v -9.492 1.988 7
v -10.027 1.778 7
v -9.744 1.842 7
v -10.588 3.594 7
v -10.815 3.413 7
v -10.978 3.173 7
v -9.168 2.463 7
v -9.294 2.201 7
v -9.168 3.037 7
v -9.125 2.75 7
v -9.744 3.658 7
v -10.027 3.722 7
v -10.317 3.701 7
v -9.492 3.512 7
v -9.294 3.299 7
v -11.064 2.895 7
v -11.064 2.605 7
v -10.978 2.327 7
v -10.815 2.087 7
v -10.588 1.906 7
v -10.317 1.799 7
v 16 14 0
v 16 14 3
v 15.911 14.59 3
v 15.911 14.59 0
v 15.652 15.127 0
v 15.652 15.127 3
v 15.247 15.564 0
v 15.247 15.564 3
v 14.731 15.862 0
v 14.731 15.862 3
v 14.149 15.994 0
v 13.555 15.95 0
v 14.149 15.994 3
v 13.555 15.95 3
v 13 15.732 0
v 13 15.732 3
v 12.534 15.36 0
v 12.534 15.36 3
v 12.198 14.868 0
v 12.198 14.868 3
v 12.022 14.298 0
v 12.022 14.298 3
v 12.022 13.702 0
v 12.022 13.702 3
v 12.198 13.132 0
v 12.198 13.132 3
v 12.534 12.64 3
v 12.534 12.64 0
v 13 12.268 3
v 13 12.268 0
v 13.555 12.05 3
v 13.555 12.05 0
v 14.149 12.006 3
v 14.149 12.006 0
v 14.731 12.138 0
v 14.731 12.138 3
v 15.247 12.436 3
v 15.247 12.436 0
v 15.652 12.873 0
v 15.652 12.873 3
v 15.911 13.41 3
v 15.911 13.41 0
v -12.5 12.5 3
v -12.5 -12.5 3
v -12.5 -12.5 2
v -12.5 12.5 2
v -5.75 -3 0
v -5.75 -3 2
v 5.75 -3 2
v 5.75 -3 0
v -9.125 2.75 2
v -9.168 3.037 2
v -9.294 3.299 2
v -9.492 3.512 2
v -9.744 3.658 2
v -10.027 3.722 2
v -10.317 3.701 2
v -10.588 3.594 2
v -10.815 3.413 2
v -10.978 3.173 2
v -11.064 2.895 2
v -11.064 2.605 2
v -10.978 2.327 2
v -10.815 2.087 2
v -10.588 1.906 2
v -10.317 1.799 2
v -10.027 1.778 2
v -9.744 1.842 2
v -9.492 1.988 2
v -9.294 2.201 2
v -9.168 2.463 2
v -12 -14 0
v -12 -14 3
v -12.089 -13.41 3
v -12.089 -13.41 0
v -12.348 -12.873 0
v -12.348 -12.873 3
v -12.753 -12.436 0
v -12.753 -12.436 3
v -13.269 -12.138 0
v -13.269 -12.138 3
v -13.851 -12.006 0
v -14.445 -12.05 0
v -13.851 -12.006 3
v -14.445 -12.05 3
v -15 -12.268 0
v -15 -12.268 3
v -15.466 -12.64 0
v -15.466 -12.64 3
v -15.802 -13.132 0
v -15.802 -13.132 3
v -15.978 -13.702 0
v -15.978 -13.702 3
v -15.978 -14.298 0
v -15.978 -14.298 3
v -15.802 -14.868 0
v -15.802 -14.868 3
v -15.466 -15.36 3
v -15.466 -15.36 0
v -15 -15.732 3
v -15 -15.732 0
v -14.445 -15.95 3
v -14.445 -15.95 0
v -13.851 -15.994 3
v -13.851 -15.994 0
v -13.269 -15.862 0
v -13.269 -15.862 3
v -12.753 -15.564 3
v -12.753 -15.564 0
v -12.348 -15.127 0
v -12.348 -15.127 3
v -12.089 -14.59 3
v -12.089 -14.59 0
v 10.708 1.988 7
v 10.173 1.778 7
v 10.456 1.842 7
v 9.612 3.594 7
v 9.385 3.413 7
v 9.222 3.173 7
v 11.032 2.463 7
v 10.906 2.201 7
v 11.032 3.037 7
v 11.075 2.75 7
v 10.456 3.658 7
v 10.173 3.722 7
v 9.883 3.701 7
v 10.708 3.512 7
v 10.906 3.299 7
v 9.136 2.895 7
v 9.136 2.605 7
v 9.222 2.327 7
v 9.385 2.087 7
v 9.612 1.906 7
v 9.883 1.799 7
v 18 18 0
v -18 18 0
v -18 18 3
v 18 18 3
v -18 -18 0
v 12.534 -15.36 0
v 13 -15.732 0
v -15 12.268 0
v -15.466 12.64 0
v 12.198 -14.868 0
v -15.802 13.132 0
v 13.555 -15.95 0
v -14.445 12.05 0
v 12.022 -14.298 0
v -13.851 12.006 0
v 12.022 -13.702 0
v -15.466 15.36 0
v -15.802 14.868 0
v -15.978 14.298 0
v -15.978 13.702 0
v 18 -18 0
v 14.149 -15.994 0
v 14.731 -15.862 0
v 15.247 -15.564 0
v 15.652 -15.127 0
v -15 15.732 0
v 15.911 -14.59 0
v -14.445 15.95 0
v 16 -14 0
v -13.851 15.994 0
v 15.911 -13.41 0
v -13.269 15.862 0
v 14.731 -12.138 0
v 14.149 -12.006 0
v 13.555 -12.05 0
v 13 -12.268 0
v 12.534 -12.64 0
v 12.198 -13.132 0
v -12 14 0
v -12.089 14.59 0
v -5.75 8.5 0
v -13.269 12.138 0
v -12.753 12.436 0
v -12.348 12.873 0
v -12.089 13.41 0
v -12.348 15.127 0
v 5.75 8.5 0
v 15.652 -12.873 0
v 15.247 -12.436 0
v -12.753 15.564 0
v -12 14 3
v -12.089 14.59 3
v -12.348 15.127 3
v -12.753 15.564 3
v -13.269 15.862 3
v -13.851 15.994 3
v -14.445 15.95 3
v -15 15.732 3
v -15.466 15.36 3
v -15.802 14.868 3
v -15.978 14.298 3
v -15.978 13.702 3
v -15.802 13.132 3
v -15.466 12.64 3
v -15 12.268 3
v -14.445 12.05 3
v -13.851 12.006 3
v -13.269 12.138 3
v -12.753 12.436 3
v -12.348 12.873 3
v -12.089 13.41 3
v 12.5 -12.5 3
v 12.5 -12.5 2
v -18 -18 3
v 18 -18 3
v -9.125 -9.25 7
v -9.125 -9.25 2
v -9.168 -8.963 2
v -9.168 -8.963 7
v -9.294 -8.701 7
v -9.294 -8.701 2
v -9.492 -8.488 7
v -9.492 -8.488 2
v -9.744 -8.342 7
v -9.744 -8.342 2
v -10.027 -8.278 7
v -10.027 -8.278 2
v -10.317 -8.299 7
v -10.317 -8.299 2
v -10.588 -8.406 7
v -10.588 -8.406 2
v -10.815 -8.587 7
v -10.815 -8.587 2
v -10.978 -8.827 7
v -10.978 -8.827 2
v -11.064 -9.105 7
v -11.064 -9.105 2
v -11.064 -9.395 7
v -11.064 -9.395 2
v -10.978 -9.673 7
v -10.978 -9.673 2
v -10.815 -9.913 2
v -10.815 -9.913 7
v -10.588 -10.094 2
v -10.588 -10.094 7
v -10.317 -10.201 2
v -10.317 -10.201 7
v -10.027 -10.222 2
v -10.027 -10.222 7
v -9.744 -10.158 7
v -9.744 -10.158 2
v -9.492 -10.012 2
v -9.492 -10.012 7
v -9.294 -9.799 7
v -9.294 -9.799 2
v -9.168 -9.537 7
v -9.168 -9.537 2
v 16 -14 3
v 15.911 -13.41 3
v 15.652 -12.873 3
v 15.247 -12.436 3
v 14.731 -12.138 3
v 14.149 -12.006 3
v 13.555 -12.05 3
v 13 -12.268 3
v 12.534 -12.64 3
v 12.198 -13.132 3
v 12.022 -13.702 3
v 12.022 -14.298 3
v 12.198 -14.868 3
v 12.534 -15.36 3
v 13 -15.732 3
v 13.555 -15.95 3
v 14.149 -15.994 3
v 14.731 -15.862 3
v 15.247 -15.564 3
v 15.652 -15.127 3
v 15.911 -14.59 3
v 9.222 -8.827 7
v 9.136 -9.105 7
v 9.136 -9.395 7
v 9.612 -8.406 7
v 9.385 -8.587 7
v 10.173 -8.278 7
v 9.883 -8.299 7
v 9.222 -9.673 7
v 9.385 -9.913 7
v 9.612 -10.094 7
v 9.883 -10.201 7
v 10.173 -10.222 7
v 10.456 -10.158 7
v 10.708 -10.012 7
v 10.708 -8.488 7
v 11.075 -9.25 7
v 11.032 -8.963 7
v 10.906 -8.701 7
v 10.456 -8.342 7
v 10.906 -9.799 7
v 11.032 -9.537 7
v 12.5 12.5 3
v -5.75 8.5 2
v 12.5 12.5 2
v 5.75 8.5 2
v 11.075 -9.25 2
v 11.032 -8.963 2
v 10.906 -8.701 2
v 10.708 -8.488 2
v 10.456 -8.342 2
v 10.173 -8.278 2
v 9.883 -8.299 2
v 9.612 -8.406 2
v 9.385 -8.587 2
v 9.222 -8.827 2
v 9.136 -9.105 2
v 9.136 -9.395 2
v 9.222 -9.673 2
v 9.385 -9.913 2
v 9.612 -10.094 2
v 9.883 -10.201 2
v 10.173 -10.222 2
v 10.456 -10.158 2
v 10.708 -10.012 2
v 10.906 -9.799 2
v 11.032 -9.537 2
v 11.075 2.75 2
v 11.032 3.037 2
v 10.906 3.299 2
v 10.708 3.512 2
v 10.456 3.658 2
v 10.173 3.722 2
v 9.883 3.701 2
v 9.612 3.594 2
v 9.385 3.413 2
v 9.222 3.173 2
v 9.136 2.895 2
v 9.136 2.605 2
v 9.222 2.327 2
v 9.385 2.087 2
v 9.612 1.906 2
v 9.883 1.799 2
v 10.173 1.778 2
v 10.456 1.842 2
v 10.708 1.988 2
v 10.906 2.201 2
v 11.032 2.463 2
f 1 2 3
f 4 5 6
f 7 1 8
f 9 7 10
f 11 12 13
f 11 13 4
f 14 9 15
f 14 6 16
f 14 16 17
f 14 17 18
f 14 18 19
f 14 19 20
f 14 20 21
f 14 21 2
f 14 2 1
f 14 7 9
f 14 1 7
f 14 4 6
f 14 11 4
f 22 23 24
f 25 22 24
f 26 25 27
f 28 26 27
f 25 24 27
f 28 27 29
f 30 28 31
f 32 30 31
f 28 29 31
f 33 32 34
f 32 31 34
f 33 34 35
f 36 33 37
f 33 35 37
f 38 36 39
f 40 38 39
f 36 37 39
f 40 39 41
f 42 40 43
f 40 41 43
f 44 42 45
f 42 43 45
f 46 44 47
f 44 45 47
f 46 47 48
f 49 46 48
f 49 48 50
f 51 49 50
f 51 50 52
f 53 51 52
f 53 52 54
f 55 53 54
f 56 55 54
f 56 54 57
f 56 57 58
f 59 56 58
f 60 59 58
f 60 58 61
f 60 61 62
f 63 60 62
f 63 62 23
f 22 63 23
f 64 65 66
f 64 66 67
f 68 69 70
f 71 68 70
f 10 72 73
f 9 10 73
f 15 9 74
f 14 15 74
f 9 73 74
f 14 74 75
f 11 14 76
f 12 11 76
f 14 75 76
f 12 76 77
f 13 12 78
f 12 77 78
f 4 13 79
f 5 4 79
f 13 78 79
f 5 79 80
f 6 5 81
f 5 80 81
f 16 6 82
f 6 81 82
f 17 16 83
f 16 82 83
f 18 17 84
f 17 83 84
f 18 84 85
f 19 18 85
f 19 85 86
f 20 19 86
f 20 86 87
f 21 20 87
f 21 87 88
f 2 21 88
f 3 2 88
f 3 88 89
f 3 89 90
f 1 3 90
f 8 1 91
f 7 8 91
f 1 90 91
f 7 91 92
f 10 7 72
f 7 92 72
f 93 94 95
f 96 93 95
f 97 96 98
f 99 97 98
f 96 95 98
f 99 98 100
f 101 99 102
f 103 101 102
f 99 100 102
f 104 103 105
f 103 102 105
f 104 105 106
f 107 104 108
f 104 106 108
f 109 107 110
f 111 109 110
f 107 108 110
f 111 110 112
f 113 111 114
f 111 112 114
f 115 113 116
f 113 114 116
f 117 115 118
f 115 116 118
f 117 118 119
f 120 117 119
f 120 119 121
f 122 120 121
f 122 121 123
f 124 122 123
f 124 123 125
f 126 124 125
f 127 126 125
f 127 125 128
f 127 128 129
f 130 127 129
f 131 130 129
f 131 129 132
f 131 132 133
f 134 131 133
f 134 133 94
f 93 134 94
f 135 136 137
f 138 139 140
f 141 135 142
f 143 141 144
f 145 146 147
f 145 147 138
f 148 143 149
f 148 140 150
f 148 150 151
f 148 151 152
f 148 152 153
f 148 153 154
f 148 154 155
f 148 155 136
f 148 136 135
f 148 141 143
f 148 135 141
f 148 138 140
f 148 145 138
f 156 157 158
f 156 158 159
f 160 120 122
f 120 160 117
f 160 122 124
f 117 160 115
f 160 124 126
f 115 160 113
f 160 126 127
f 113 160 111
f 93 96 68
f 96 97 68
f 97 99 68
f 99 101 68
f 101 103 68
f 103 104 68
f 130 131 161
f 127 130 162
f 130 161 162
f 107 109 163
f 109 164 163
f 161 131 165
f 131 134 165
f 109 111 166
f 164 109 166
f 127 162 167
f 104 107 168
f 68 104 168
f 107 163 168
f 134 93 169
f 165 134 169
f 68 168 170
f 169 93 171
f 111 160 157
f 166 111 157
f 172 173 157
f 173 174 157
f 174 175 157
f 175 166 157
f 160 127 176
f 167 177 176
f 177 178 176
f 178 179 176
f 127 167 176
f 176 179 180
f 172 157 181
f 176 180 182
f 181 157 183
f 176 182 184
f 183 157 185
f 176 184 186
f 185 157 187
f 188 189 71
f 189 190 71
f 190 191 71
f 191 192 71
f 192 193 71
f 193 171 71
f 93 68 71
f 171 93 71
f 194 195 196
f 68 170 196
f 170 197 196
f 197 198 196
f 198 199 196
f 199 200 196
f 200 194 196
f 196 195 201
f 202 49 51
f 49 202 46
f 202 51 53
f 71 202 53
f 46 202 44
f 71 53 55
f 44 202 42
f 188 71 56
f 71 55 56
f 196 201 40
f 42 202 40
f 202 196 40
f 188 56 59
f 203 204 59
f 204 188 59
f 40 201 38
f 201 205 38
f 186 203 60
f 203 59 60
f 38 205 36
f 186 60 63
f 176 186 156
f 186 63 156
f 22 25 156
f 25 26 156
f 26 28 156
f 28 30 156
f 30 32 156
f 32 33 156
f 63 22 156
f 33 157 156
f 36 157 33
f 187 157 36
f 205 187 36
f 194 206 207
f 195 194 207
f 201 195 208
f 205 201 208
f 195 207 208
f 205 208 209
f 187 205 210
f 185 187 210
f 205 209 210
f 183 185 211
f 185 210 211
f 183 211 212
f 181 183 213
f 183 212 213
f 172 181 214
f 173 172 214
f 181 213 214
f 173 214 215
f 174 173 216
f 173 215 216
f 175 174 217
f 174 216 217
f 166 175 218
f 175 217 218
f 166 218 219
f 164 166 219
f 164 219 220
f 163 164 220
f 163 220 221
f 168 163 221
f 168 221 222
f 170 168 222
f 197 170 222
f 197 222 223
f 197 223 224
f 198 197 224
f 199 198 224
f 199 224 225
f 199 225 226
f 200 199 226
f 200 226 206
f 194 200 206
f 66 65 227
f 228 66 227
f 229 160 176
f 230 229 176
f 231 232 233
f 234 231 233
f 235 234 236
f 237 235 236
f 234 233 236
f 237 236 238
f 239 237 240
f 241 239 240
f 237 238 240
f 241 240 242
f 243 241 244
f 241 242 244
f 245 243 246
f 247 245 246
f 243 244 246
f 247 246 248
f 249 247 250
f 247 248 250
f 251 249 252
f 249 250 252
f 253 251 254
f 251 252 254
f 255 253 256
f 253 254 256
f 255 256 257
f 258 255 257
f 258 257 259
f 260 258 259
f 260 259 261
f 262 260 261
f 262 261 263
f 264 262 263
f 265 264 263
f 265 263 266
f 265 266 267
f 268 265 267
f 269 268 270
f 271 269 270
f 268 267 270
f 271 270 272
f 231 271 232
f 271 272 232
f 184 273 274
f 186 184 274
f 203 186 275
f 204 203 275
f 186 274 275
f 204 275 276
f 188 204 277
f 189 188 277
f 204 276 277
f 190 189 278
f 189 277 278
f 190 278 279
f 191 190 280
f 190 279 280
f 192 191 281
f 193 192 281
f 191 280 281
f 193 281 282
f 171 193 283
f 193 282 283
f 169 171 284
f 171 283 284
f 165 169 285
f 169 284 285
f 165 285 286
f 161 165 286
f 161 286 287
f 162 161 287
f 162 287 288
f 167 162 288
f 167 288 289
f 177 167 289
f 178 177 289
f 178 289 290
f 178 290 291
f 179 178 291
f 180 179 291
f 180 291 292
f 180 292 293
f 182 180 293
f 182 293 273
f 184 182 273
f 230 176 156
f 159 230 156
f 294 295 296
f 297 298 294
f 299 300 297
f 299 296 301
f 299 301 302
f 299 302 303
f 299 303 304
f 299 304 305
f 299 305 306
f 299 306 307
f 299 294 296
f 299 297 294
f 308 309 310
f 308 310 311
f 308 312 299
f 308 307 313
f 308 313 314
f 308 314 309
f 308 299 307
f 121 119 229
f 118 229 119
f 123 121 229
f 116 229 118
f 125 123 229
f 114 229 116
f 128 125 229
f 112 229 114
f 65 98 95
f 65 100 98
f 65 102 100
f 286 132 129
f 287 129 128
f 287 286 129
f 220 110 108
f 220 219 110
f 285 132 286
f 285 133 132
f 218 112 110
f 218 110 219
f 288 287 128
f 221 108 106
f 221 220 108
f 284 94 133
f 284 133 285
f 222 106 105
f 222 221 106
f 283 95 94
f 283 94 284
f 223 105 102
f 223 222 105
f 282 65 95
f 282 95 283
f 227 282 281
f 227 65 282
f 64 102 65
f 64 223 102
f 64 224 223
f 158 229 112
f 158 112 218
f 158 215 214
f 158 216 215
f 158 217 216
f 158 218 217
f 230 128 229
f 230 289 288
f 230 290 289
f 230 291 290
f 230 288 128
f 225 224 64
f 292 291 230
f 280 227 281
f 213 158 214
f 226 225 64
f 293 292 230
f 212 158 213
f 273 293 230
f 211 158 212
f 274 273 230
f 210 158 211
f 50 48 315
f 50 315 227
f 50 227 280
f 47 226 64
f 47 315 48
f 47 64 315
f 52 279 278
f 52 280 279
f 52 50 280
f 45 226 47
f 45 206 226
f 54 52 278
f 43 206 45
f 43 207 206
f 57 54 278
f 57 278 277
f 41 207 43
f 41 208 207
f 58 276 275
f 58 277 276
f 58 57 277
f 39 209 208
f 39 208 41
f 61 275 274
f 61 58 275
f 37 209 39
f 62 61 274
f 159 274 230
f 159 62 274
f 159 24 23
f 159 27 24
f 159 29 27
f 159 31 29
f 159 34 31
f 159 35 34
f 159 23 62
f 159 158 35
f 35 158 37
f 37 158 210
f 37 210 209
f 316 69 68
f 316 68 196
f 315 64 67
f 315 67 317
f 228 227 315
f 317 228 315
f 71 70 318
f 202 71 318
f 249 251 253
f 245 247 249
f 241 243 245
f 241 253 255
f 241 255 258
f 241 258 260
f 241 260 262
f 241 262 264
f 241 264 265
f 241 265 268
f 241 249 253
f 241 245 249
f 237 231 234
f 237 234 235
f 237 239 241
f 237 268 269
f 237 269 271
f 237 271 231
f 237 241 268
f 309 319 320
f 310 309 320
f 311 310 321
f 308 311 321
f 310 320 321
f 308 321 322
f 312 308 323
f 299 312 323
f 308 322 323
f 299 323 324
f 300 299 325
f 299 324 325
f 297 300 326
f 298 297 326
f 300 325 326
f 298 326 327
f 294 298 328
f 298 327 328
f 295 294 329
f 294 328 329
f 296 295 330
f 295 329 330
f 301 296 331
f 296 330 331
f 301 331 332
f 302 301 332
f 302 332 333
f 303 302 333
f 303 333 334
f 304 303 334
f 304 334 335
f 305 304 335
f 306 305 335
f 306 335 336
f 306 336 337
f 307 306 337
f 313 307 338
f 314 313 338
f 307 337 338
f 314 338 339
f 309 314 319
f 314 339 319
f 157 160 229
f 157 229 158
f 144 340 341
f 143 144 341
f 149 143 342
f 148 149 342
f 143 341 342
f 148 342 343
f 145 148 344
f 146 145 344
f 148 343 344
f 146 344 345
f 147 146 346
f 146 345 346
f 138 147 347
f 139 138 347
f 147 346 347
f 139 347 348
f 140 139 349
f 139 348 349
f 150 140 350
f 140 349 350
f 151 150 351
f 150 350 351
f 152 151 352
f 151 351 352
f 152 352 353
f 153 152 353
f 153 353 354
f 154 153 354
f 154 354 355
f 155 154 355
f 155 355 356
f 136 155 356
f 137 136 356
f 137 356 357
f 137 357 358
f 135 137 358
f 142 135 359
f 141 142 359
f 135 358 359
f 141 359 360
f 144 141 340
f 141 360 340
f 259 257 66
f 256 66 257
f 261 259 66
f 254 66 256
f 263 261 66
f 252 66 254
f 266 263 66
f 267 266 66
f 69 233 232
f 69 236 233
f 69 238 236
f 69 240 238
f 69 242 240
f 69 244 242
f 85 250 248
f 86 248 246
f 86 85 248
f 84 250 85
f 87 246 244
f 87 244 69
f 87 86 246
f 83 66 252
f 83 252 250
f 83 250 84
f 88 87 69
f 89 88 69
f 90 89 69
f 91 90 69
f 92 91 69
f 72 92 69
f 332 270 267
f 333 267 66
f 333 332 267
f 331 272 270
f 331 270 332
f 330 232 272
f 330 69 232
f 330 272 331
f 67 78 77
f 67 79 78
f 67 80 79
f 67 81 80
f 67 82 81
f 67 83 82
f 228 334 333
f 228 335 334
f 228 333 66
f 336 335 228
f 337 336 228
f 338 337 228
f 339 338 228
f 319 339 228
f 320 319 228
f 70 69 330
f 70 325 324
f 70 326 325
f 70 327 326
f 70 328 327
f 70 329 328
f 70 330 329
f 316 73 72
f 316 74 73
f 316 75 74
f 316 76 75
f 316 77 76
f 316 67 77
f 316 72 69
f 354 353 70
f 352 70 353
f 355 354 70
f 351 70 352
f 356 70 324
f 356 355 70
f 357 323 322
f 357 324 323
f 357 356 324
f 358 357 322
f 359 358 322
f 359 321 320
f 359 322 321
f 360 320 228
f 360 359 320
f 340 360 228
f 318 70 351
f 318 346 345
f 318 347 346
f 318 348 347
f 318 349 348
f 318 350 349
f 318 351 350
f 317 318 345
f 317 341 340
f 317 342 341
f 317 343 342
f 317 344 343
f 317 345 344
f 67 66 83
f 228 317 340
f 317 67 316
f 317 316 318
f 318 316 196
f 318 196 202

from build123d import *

# Parameters (mm, degrees)
SKETCH1_W           = 36
SKETCH1_H           = 36
BOSS_EXTRUDE1_DEPTH = 3
SKETCH5_R           = 2
CUT_EXTRUDE3_DEPTH  = 10
SKETCH2_W           = 25
SKETCH2_H           = 25
CUT_EXTRUDE1_DEPTH  = 1
SKETCH4_W           = 11.5
SKETCH4_H           = 11.5
CUT_EXTRUDE4_DEPTH  = 3
SKETCH3_R           = 0.975
BOSS_EXTRUDE2_DEPTH = 5


with BuildPart() as part:
    # Sketch1 → Boss-Extrude1 (new body)
    with BuildSketch(Plane.XY):
        Rectangle(SKETCH1_W, SKETCH1_H)
    extrude(amount=BOSS_EXTRUDE1_DEPTH)

    # Sketch5 → Cut-Extrude3 (cut)
    with BuildSketch(Plane.XY.offset(3)):
        with Locations((-14, 14)):
            Circle(SKETCH5_R)
        with Locations((-14, -14)):
            Circle(SKETCH5_R)
        with Locations((14, -14)):
            Circle(SKETCH5_R)
        with Locations((14, 14)):
            Circle(SKETCH5_R)
    extrude(amount=-CUT_EXTRUDE3_DEPTH, mode=Mode.SUBTRACT)

    # Sketch2 → Cut-Extrude1 (cut)
    with BuildSketch(Plane.XY.offset(3)):
        Rectangle(SKETCH2_W, SKETCH2_H)
    extrude(amount=-CUT_EXTRUDE1_DEPTH, mode=Mode.SUBTRACT)

    # Sketch4 → Cut-Extrude4 (cut, through all)
    with BuildSketch(Plane.XY.offset(2)):
        with Locations((0, 2.75)):
            Rectangle(SKETCH4_W, SKETCH4_H)
    extrude(amount=-CUT_EXTRUDE4_DEPTH, mode=Mode.SUBTRACT)

    # Sketch3 → Boss-Extrude2 (add)
    with BuildSketch(Plane.XY.offset(2)):
        with Locations((10.1, 2.75)):
            Circle(SKETCH3_R)
        with Locations((10.1, -9.25)):
            Circle(SKETCH3_R)
        with Locations((-10.1, -9.25)):
            Circle(SKETCH3_R)
        with Locations((-10.1, 2.75)):
            Circle(SKETCH3_R)
    extrude(amount=BOSS_EXTRUDE2_DEPTH)


solid = part.part
